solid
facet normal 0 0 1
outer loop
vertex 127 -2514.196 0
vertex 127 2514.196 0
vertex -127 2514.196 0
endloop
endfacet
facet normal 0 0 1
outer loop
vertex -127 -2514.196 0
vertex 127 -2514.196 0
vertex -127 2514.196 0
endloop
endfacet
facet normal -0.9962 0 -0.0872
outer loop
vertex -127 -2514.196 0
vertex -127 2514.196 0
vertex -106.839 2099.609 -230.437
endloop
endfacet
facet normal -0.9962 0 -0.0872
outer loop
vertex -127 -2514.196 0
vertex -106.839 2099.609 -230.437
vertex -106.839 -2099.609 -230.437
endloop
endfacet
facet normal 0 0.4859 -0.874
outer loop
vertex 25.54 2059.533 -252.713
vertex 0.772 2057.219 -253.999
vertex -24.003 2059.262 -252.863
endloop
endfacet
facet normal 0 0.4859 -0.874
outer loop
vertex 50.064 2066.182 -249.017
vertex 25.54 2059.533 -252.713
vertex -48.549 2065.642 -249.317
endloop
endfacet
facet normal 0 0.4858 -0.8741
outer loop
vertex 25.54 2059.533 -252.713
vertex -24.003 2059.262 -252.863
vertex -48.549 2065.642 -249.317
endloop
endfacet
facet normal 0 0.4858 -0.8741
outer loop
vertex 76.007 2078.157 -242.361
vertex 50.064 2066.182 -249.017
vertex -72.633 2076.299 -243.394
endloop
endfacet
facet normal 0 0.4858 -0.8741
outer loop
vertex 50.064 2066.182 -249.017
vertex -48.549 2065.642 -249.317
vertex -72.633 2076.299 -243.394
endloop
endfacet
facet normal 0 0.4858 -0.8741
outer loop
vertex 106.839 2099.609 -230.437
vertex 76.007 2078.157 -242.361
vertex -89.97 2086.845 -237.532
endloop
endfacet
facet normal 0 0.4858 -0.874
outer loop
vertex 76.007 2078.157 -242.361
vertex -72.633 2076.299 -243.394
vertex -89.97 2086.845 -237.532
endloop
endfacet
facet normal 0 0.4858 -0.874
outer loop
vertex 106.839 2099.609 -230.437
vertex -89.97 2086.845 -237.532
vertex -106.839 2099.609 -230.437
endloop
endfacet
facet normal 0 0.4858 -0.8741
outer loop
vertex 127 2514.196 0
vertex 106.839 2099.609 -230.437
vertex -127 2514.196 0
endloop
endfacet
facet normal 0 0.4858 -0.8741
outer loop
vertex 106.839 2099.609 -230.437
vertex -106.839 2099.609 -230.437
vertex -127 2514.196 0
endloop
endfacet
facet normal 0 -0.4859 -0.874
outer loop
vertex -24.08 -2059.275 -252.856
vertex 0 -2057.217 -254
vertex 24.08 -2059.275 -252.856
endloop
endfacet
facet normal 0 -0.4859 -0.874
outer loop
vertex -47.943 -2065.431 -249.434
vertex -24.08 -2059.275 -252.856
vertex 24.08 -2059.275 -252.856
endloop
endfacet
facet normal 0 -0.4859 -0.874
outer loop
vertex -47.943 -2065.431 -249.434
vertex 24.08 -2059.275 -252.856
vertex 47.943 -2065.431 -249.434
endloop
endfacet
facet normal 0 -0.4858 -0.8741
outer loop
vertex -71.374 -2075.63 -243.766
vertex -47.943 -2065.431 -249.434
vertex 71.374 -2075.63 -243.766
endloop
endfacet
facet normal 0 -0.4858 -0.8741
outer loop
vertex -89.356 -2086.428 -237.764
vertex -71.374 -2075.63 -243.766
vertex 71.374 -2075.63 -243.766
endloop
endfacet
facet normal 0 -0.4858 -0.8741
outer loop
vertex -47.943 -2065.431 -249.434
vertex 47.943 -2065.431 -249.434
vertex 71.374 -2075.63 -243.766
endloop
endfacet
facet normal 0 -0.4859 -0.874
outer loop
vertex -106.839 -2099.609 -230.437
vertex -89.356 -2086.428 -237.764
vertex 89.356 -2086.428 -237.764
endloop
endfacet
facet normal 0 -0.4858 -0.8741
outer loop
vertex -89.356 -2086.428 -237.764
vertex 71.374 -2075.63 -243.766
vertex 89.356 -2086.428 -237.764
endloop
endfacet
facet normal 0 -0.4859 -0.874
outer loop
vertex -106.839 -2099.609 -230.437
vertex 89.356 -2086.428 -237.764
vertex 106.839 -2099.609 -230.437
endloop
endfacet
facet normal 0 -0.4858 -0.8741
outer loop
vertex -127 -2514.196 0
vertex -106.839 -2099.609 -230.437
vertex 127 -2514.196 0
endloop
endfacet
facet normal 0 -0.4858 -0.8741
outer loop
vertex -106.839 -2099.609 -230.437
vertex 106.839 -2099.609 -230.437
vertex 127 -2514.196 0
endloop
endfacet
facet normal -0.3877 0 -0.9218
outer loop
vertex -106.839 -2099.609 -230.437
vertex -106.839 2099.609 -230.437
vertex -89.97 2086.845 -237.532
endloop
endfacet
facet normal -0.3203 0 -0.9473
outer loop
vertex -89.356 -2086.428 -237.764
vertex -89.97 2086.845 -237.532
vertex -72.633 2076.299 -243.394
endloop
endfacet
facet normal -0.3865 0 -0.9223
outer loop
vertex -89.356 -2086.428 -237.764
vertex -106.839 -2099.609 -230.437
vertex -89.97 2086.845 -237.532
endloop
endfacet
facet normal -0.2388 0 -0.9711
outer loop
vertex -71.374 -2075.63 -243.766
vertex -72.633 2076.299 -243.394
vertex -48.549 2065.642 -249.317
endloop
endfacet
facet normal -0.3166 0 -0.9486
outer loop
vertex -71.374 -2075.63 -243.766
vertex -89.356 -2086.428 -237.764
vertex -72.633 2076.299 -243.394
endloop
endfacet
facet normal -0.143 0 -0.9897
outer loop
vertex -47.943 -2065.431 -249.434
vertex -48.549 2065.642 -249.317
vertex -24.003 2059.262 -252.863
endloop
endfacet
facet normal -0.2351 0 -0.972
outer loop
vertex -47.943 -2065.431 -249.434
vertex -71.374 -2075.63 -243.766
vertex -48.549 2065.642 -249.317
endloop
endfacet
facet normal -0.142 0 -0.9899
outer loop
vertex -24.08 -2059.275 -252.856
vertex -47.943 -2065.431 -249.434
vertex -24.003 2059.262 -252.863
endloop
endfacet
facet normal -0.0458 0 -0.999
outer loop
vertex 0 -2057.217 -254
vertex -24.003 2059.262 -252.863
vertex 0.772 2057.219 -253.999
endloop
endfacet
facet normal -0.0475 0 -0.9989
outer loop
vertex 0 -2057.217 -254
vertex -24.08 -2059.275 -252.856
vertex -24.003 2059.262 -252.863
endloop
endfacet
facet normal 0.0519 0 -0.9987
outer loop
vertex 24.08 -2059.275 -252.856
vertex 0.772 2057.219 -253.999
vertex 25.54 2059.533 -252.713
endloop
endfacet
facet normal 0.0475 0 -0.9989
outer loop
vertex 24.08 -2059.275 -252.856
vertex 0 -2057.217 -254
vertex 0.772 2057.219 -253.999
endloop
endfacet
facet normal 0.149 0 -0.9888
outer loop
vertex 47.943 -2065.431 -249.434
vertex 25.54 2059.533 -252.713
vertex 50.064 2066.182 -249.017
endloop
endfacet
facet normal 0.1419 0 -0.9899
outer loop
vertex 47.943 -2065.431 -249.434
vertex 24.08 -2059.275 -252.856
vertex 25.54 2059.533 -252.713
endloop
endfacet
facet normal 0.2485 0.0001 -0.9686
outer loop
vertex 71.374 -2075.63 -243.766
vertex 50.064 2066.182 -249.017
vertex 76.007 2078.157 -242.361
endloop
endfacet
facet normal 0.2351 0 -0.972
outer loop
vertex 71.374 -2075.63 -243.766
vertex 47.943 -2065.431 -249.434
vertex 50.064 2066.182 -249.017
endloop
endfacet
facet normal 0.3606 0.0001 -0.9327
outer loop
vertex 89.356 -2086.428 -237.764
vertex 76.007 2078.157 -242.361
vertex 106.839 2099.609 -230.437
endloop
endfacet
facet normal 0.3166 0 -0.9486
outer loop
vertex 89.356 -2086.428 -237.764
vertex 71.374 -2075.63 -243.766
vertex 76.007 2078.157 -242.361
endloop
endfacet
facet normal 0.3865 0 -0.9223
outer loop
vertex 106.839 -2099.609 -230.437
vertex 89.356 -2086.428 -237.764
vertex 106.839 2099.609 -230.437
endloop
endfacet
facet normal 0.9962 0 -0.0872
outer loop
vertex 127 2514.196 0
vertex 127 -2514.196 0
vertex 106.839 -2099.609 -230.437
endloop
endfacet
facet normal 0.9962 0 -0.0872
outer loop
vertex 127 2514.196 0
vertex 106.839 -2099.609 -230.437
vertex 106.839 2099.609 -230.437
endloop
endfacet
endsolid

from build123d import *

# Parameters (mm, degrees)
F1_DEPTH      = 2540
F3_DEPTH      = 127.001
F3_DEPTH_BACK = 127.001


# Not quite as in the source:
# - a pattern or mirror of a feature is missing from the dataset's text; its kind, count and spacing are read off the source's solid


with BuildPart() as f1:
    # F0 (on Front) → F1 (new body, symmetric)
    with BuildSketch(Plane.XZ):
        with BuildLine():
            Line((-127, 0), (-106.8393477338, -230.4373098607))
            ThreePointArc((-106.8393477338, -230.4373098607), (0, -254), (106.8393477338, -230.4373098607))
            Line((106.8393477338, -230.4373098607), (127, 0))
            Line((127, 0), (-127, 0))
        make_face()
    extrude(amount=F1_DEPTH, both=True)

    # F2 (on Right) → F3 (cut, two sides)
    with BuildSketch(Plane.YZ) as f3_sk:
        Polygon((-1970.9674119949, -301.9396364689), (-2584.4640731812, 39.0566559158), (-2584.4640731812, -301.9396364689), align=None)
    f3 = extrude(amount=F3_DEPTH, mode=Mode.SUBTRACT) + extrude(f3_sk.sketch, amount=-F3_DEPTH_BACK, mode=Mode.SUBTRACT)

    # F3_copies: F3 across plane
    add(f3.mirror(Plane.ZX), mode=Mode.SUBTRACT)


solid = f1.part
